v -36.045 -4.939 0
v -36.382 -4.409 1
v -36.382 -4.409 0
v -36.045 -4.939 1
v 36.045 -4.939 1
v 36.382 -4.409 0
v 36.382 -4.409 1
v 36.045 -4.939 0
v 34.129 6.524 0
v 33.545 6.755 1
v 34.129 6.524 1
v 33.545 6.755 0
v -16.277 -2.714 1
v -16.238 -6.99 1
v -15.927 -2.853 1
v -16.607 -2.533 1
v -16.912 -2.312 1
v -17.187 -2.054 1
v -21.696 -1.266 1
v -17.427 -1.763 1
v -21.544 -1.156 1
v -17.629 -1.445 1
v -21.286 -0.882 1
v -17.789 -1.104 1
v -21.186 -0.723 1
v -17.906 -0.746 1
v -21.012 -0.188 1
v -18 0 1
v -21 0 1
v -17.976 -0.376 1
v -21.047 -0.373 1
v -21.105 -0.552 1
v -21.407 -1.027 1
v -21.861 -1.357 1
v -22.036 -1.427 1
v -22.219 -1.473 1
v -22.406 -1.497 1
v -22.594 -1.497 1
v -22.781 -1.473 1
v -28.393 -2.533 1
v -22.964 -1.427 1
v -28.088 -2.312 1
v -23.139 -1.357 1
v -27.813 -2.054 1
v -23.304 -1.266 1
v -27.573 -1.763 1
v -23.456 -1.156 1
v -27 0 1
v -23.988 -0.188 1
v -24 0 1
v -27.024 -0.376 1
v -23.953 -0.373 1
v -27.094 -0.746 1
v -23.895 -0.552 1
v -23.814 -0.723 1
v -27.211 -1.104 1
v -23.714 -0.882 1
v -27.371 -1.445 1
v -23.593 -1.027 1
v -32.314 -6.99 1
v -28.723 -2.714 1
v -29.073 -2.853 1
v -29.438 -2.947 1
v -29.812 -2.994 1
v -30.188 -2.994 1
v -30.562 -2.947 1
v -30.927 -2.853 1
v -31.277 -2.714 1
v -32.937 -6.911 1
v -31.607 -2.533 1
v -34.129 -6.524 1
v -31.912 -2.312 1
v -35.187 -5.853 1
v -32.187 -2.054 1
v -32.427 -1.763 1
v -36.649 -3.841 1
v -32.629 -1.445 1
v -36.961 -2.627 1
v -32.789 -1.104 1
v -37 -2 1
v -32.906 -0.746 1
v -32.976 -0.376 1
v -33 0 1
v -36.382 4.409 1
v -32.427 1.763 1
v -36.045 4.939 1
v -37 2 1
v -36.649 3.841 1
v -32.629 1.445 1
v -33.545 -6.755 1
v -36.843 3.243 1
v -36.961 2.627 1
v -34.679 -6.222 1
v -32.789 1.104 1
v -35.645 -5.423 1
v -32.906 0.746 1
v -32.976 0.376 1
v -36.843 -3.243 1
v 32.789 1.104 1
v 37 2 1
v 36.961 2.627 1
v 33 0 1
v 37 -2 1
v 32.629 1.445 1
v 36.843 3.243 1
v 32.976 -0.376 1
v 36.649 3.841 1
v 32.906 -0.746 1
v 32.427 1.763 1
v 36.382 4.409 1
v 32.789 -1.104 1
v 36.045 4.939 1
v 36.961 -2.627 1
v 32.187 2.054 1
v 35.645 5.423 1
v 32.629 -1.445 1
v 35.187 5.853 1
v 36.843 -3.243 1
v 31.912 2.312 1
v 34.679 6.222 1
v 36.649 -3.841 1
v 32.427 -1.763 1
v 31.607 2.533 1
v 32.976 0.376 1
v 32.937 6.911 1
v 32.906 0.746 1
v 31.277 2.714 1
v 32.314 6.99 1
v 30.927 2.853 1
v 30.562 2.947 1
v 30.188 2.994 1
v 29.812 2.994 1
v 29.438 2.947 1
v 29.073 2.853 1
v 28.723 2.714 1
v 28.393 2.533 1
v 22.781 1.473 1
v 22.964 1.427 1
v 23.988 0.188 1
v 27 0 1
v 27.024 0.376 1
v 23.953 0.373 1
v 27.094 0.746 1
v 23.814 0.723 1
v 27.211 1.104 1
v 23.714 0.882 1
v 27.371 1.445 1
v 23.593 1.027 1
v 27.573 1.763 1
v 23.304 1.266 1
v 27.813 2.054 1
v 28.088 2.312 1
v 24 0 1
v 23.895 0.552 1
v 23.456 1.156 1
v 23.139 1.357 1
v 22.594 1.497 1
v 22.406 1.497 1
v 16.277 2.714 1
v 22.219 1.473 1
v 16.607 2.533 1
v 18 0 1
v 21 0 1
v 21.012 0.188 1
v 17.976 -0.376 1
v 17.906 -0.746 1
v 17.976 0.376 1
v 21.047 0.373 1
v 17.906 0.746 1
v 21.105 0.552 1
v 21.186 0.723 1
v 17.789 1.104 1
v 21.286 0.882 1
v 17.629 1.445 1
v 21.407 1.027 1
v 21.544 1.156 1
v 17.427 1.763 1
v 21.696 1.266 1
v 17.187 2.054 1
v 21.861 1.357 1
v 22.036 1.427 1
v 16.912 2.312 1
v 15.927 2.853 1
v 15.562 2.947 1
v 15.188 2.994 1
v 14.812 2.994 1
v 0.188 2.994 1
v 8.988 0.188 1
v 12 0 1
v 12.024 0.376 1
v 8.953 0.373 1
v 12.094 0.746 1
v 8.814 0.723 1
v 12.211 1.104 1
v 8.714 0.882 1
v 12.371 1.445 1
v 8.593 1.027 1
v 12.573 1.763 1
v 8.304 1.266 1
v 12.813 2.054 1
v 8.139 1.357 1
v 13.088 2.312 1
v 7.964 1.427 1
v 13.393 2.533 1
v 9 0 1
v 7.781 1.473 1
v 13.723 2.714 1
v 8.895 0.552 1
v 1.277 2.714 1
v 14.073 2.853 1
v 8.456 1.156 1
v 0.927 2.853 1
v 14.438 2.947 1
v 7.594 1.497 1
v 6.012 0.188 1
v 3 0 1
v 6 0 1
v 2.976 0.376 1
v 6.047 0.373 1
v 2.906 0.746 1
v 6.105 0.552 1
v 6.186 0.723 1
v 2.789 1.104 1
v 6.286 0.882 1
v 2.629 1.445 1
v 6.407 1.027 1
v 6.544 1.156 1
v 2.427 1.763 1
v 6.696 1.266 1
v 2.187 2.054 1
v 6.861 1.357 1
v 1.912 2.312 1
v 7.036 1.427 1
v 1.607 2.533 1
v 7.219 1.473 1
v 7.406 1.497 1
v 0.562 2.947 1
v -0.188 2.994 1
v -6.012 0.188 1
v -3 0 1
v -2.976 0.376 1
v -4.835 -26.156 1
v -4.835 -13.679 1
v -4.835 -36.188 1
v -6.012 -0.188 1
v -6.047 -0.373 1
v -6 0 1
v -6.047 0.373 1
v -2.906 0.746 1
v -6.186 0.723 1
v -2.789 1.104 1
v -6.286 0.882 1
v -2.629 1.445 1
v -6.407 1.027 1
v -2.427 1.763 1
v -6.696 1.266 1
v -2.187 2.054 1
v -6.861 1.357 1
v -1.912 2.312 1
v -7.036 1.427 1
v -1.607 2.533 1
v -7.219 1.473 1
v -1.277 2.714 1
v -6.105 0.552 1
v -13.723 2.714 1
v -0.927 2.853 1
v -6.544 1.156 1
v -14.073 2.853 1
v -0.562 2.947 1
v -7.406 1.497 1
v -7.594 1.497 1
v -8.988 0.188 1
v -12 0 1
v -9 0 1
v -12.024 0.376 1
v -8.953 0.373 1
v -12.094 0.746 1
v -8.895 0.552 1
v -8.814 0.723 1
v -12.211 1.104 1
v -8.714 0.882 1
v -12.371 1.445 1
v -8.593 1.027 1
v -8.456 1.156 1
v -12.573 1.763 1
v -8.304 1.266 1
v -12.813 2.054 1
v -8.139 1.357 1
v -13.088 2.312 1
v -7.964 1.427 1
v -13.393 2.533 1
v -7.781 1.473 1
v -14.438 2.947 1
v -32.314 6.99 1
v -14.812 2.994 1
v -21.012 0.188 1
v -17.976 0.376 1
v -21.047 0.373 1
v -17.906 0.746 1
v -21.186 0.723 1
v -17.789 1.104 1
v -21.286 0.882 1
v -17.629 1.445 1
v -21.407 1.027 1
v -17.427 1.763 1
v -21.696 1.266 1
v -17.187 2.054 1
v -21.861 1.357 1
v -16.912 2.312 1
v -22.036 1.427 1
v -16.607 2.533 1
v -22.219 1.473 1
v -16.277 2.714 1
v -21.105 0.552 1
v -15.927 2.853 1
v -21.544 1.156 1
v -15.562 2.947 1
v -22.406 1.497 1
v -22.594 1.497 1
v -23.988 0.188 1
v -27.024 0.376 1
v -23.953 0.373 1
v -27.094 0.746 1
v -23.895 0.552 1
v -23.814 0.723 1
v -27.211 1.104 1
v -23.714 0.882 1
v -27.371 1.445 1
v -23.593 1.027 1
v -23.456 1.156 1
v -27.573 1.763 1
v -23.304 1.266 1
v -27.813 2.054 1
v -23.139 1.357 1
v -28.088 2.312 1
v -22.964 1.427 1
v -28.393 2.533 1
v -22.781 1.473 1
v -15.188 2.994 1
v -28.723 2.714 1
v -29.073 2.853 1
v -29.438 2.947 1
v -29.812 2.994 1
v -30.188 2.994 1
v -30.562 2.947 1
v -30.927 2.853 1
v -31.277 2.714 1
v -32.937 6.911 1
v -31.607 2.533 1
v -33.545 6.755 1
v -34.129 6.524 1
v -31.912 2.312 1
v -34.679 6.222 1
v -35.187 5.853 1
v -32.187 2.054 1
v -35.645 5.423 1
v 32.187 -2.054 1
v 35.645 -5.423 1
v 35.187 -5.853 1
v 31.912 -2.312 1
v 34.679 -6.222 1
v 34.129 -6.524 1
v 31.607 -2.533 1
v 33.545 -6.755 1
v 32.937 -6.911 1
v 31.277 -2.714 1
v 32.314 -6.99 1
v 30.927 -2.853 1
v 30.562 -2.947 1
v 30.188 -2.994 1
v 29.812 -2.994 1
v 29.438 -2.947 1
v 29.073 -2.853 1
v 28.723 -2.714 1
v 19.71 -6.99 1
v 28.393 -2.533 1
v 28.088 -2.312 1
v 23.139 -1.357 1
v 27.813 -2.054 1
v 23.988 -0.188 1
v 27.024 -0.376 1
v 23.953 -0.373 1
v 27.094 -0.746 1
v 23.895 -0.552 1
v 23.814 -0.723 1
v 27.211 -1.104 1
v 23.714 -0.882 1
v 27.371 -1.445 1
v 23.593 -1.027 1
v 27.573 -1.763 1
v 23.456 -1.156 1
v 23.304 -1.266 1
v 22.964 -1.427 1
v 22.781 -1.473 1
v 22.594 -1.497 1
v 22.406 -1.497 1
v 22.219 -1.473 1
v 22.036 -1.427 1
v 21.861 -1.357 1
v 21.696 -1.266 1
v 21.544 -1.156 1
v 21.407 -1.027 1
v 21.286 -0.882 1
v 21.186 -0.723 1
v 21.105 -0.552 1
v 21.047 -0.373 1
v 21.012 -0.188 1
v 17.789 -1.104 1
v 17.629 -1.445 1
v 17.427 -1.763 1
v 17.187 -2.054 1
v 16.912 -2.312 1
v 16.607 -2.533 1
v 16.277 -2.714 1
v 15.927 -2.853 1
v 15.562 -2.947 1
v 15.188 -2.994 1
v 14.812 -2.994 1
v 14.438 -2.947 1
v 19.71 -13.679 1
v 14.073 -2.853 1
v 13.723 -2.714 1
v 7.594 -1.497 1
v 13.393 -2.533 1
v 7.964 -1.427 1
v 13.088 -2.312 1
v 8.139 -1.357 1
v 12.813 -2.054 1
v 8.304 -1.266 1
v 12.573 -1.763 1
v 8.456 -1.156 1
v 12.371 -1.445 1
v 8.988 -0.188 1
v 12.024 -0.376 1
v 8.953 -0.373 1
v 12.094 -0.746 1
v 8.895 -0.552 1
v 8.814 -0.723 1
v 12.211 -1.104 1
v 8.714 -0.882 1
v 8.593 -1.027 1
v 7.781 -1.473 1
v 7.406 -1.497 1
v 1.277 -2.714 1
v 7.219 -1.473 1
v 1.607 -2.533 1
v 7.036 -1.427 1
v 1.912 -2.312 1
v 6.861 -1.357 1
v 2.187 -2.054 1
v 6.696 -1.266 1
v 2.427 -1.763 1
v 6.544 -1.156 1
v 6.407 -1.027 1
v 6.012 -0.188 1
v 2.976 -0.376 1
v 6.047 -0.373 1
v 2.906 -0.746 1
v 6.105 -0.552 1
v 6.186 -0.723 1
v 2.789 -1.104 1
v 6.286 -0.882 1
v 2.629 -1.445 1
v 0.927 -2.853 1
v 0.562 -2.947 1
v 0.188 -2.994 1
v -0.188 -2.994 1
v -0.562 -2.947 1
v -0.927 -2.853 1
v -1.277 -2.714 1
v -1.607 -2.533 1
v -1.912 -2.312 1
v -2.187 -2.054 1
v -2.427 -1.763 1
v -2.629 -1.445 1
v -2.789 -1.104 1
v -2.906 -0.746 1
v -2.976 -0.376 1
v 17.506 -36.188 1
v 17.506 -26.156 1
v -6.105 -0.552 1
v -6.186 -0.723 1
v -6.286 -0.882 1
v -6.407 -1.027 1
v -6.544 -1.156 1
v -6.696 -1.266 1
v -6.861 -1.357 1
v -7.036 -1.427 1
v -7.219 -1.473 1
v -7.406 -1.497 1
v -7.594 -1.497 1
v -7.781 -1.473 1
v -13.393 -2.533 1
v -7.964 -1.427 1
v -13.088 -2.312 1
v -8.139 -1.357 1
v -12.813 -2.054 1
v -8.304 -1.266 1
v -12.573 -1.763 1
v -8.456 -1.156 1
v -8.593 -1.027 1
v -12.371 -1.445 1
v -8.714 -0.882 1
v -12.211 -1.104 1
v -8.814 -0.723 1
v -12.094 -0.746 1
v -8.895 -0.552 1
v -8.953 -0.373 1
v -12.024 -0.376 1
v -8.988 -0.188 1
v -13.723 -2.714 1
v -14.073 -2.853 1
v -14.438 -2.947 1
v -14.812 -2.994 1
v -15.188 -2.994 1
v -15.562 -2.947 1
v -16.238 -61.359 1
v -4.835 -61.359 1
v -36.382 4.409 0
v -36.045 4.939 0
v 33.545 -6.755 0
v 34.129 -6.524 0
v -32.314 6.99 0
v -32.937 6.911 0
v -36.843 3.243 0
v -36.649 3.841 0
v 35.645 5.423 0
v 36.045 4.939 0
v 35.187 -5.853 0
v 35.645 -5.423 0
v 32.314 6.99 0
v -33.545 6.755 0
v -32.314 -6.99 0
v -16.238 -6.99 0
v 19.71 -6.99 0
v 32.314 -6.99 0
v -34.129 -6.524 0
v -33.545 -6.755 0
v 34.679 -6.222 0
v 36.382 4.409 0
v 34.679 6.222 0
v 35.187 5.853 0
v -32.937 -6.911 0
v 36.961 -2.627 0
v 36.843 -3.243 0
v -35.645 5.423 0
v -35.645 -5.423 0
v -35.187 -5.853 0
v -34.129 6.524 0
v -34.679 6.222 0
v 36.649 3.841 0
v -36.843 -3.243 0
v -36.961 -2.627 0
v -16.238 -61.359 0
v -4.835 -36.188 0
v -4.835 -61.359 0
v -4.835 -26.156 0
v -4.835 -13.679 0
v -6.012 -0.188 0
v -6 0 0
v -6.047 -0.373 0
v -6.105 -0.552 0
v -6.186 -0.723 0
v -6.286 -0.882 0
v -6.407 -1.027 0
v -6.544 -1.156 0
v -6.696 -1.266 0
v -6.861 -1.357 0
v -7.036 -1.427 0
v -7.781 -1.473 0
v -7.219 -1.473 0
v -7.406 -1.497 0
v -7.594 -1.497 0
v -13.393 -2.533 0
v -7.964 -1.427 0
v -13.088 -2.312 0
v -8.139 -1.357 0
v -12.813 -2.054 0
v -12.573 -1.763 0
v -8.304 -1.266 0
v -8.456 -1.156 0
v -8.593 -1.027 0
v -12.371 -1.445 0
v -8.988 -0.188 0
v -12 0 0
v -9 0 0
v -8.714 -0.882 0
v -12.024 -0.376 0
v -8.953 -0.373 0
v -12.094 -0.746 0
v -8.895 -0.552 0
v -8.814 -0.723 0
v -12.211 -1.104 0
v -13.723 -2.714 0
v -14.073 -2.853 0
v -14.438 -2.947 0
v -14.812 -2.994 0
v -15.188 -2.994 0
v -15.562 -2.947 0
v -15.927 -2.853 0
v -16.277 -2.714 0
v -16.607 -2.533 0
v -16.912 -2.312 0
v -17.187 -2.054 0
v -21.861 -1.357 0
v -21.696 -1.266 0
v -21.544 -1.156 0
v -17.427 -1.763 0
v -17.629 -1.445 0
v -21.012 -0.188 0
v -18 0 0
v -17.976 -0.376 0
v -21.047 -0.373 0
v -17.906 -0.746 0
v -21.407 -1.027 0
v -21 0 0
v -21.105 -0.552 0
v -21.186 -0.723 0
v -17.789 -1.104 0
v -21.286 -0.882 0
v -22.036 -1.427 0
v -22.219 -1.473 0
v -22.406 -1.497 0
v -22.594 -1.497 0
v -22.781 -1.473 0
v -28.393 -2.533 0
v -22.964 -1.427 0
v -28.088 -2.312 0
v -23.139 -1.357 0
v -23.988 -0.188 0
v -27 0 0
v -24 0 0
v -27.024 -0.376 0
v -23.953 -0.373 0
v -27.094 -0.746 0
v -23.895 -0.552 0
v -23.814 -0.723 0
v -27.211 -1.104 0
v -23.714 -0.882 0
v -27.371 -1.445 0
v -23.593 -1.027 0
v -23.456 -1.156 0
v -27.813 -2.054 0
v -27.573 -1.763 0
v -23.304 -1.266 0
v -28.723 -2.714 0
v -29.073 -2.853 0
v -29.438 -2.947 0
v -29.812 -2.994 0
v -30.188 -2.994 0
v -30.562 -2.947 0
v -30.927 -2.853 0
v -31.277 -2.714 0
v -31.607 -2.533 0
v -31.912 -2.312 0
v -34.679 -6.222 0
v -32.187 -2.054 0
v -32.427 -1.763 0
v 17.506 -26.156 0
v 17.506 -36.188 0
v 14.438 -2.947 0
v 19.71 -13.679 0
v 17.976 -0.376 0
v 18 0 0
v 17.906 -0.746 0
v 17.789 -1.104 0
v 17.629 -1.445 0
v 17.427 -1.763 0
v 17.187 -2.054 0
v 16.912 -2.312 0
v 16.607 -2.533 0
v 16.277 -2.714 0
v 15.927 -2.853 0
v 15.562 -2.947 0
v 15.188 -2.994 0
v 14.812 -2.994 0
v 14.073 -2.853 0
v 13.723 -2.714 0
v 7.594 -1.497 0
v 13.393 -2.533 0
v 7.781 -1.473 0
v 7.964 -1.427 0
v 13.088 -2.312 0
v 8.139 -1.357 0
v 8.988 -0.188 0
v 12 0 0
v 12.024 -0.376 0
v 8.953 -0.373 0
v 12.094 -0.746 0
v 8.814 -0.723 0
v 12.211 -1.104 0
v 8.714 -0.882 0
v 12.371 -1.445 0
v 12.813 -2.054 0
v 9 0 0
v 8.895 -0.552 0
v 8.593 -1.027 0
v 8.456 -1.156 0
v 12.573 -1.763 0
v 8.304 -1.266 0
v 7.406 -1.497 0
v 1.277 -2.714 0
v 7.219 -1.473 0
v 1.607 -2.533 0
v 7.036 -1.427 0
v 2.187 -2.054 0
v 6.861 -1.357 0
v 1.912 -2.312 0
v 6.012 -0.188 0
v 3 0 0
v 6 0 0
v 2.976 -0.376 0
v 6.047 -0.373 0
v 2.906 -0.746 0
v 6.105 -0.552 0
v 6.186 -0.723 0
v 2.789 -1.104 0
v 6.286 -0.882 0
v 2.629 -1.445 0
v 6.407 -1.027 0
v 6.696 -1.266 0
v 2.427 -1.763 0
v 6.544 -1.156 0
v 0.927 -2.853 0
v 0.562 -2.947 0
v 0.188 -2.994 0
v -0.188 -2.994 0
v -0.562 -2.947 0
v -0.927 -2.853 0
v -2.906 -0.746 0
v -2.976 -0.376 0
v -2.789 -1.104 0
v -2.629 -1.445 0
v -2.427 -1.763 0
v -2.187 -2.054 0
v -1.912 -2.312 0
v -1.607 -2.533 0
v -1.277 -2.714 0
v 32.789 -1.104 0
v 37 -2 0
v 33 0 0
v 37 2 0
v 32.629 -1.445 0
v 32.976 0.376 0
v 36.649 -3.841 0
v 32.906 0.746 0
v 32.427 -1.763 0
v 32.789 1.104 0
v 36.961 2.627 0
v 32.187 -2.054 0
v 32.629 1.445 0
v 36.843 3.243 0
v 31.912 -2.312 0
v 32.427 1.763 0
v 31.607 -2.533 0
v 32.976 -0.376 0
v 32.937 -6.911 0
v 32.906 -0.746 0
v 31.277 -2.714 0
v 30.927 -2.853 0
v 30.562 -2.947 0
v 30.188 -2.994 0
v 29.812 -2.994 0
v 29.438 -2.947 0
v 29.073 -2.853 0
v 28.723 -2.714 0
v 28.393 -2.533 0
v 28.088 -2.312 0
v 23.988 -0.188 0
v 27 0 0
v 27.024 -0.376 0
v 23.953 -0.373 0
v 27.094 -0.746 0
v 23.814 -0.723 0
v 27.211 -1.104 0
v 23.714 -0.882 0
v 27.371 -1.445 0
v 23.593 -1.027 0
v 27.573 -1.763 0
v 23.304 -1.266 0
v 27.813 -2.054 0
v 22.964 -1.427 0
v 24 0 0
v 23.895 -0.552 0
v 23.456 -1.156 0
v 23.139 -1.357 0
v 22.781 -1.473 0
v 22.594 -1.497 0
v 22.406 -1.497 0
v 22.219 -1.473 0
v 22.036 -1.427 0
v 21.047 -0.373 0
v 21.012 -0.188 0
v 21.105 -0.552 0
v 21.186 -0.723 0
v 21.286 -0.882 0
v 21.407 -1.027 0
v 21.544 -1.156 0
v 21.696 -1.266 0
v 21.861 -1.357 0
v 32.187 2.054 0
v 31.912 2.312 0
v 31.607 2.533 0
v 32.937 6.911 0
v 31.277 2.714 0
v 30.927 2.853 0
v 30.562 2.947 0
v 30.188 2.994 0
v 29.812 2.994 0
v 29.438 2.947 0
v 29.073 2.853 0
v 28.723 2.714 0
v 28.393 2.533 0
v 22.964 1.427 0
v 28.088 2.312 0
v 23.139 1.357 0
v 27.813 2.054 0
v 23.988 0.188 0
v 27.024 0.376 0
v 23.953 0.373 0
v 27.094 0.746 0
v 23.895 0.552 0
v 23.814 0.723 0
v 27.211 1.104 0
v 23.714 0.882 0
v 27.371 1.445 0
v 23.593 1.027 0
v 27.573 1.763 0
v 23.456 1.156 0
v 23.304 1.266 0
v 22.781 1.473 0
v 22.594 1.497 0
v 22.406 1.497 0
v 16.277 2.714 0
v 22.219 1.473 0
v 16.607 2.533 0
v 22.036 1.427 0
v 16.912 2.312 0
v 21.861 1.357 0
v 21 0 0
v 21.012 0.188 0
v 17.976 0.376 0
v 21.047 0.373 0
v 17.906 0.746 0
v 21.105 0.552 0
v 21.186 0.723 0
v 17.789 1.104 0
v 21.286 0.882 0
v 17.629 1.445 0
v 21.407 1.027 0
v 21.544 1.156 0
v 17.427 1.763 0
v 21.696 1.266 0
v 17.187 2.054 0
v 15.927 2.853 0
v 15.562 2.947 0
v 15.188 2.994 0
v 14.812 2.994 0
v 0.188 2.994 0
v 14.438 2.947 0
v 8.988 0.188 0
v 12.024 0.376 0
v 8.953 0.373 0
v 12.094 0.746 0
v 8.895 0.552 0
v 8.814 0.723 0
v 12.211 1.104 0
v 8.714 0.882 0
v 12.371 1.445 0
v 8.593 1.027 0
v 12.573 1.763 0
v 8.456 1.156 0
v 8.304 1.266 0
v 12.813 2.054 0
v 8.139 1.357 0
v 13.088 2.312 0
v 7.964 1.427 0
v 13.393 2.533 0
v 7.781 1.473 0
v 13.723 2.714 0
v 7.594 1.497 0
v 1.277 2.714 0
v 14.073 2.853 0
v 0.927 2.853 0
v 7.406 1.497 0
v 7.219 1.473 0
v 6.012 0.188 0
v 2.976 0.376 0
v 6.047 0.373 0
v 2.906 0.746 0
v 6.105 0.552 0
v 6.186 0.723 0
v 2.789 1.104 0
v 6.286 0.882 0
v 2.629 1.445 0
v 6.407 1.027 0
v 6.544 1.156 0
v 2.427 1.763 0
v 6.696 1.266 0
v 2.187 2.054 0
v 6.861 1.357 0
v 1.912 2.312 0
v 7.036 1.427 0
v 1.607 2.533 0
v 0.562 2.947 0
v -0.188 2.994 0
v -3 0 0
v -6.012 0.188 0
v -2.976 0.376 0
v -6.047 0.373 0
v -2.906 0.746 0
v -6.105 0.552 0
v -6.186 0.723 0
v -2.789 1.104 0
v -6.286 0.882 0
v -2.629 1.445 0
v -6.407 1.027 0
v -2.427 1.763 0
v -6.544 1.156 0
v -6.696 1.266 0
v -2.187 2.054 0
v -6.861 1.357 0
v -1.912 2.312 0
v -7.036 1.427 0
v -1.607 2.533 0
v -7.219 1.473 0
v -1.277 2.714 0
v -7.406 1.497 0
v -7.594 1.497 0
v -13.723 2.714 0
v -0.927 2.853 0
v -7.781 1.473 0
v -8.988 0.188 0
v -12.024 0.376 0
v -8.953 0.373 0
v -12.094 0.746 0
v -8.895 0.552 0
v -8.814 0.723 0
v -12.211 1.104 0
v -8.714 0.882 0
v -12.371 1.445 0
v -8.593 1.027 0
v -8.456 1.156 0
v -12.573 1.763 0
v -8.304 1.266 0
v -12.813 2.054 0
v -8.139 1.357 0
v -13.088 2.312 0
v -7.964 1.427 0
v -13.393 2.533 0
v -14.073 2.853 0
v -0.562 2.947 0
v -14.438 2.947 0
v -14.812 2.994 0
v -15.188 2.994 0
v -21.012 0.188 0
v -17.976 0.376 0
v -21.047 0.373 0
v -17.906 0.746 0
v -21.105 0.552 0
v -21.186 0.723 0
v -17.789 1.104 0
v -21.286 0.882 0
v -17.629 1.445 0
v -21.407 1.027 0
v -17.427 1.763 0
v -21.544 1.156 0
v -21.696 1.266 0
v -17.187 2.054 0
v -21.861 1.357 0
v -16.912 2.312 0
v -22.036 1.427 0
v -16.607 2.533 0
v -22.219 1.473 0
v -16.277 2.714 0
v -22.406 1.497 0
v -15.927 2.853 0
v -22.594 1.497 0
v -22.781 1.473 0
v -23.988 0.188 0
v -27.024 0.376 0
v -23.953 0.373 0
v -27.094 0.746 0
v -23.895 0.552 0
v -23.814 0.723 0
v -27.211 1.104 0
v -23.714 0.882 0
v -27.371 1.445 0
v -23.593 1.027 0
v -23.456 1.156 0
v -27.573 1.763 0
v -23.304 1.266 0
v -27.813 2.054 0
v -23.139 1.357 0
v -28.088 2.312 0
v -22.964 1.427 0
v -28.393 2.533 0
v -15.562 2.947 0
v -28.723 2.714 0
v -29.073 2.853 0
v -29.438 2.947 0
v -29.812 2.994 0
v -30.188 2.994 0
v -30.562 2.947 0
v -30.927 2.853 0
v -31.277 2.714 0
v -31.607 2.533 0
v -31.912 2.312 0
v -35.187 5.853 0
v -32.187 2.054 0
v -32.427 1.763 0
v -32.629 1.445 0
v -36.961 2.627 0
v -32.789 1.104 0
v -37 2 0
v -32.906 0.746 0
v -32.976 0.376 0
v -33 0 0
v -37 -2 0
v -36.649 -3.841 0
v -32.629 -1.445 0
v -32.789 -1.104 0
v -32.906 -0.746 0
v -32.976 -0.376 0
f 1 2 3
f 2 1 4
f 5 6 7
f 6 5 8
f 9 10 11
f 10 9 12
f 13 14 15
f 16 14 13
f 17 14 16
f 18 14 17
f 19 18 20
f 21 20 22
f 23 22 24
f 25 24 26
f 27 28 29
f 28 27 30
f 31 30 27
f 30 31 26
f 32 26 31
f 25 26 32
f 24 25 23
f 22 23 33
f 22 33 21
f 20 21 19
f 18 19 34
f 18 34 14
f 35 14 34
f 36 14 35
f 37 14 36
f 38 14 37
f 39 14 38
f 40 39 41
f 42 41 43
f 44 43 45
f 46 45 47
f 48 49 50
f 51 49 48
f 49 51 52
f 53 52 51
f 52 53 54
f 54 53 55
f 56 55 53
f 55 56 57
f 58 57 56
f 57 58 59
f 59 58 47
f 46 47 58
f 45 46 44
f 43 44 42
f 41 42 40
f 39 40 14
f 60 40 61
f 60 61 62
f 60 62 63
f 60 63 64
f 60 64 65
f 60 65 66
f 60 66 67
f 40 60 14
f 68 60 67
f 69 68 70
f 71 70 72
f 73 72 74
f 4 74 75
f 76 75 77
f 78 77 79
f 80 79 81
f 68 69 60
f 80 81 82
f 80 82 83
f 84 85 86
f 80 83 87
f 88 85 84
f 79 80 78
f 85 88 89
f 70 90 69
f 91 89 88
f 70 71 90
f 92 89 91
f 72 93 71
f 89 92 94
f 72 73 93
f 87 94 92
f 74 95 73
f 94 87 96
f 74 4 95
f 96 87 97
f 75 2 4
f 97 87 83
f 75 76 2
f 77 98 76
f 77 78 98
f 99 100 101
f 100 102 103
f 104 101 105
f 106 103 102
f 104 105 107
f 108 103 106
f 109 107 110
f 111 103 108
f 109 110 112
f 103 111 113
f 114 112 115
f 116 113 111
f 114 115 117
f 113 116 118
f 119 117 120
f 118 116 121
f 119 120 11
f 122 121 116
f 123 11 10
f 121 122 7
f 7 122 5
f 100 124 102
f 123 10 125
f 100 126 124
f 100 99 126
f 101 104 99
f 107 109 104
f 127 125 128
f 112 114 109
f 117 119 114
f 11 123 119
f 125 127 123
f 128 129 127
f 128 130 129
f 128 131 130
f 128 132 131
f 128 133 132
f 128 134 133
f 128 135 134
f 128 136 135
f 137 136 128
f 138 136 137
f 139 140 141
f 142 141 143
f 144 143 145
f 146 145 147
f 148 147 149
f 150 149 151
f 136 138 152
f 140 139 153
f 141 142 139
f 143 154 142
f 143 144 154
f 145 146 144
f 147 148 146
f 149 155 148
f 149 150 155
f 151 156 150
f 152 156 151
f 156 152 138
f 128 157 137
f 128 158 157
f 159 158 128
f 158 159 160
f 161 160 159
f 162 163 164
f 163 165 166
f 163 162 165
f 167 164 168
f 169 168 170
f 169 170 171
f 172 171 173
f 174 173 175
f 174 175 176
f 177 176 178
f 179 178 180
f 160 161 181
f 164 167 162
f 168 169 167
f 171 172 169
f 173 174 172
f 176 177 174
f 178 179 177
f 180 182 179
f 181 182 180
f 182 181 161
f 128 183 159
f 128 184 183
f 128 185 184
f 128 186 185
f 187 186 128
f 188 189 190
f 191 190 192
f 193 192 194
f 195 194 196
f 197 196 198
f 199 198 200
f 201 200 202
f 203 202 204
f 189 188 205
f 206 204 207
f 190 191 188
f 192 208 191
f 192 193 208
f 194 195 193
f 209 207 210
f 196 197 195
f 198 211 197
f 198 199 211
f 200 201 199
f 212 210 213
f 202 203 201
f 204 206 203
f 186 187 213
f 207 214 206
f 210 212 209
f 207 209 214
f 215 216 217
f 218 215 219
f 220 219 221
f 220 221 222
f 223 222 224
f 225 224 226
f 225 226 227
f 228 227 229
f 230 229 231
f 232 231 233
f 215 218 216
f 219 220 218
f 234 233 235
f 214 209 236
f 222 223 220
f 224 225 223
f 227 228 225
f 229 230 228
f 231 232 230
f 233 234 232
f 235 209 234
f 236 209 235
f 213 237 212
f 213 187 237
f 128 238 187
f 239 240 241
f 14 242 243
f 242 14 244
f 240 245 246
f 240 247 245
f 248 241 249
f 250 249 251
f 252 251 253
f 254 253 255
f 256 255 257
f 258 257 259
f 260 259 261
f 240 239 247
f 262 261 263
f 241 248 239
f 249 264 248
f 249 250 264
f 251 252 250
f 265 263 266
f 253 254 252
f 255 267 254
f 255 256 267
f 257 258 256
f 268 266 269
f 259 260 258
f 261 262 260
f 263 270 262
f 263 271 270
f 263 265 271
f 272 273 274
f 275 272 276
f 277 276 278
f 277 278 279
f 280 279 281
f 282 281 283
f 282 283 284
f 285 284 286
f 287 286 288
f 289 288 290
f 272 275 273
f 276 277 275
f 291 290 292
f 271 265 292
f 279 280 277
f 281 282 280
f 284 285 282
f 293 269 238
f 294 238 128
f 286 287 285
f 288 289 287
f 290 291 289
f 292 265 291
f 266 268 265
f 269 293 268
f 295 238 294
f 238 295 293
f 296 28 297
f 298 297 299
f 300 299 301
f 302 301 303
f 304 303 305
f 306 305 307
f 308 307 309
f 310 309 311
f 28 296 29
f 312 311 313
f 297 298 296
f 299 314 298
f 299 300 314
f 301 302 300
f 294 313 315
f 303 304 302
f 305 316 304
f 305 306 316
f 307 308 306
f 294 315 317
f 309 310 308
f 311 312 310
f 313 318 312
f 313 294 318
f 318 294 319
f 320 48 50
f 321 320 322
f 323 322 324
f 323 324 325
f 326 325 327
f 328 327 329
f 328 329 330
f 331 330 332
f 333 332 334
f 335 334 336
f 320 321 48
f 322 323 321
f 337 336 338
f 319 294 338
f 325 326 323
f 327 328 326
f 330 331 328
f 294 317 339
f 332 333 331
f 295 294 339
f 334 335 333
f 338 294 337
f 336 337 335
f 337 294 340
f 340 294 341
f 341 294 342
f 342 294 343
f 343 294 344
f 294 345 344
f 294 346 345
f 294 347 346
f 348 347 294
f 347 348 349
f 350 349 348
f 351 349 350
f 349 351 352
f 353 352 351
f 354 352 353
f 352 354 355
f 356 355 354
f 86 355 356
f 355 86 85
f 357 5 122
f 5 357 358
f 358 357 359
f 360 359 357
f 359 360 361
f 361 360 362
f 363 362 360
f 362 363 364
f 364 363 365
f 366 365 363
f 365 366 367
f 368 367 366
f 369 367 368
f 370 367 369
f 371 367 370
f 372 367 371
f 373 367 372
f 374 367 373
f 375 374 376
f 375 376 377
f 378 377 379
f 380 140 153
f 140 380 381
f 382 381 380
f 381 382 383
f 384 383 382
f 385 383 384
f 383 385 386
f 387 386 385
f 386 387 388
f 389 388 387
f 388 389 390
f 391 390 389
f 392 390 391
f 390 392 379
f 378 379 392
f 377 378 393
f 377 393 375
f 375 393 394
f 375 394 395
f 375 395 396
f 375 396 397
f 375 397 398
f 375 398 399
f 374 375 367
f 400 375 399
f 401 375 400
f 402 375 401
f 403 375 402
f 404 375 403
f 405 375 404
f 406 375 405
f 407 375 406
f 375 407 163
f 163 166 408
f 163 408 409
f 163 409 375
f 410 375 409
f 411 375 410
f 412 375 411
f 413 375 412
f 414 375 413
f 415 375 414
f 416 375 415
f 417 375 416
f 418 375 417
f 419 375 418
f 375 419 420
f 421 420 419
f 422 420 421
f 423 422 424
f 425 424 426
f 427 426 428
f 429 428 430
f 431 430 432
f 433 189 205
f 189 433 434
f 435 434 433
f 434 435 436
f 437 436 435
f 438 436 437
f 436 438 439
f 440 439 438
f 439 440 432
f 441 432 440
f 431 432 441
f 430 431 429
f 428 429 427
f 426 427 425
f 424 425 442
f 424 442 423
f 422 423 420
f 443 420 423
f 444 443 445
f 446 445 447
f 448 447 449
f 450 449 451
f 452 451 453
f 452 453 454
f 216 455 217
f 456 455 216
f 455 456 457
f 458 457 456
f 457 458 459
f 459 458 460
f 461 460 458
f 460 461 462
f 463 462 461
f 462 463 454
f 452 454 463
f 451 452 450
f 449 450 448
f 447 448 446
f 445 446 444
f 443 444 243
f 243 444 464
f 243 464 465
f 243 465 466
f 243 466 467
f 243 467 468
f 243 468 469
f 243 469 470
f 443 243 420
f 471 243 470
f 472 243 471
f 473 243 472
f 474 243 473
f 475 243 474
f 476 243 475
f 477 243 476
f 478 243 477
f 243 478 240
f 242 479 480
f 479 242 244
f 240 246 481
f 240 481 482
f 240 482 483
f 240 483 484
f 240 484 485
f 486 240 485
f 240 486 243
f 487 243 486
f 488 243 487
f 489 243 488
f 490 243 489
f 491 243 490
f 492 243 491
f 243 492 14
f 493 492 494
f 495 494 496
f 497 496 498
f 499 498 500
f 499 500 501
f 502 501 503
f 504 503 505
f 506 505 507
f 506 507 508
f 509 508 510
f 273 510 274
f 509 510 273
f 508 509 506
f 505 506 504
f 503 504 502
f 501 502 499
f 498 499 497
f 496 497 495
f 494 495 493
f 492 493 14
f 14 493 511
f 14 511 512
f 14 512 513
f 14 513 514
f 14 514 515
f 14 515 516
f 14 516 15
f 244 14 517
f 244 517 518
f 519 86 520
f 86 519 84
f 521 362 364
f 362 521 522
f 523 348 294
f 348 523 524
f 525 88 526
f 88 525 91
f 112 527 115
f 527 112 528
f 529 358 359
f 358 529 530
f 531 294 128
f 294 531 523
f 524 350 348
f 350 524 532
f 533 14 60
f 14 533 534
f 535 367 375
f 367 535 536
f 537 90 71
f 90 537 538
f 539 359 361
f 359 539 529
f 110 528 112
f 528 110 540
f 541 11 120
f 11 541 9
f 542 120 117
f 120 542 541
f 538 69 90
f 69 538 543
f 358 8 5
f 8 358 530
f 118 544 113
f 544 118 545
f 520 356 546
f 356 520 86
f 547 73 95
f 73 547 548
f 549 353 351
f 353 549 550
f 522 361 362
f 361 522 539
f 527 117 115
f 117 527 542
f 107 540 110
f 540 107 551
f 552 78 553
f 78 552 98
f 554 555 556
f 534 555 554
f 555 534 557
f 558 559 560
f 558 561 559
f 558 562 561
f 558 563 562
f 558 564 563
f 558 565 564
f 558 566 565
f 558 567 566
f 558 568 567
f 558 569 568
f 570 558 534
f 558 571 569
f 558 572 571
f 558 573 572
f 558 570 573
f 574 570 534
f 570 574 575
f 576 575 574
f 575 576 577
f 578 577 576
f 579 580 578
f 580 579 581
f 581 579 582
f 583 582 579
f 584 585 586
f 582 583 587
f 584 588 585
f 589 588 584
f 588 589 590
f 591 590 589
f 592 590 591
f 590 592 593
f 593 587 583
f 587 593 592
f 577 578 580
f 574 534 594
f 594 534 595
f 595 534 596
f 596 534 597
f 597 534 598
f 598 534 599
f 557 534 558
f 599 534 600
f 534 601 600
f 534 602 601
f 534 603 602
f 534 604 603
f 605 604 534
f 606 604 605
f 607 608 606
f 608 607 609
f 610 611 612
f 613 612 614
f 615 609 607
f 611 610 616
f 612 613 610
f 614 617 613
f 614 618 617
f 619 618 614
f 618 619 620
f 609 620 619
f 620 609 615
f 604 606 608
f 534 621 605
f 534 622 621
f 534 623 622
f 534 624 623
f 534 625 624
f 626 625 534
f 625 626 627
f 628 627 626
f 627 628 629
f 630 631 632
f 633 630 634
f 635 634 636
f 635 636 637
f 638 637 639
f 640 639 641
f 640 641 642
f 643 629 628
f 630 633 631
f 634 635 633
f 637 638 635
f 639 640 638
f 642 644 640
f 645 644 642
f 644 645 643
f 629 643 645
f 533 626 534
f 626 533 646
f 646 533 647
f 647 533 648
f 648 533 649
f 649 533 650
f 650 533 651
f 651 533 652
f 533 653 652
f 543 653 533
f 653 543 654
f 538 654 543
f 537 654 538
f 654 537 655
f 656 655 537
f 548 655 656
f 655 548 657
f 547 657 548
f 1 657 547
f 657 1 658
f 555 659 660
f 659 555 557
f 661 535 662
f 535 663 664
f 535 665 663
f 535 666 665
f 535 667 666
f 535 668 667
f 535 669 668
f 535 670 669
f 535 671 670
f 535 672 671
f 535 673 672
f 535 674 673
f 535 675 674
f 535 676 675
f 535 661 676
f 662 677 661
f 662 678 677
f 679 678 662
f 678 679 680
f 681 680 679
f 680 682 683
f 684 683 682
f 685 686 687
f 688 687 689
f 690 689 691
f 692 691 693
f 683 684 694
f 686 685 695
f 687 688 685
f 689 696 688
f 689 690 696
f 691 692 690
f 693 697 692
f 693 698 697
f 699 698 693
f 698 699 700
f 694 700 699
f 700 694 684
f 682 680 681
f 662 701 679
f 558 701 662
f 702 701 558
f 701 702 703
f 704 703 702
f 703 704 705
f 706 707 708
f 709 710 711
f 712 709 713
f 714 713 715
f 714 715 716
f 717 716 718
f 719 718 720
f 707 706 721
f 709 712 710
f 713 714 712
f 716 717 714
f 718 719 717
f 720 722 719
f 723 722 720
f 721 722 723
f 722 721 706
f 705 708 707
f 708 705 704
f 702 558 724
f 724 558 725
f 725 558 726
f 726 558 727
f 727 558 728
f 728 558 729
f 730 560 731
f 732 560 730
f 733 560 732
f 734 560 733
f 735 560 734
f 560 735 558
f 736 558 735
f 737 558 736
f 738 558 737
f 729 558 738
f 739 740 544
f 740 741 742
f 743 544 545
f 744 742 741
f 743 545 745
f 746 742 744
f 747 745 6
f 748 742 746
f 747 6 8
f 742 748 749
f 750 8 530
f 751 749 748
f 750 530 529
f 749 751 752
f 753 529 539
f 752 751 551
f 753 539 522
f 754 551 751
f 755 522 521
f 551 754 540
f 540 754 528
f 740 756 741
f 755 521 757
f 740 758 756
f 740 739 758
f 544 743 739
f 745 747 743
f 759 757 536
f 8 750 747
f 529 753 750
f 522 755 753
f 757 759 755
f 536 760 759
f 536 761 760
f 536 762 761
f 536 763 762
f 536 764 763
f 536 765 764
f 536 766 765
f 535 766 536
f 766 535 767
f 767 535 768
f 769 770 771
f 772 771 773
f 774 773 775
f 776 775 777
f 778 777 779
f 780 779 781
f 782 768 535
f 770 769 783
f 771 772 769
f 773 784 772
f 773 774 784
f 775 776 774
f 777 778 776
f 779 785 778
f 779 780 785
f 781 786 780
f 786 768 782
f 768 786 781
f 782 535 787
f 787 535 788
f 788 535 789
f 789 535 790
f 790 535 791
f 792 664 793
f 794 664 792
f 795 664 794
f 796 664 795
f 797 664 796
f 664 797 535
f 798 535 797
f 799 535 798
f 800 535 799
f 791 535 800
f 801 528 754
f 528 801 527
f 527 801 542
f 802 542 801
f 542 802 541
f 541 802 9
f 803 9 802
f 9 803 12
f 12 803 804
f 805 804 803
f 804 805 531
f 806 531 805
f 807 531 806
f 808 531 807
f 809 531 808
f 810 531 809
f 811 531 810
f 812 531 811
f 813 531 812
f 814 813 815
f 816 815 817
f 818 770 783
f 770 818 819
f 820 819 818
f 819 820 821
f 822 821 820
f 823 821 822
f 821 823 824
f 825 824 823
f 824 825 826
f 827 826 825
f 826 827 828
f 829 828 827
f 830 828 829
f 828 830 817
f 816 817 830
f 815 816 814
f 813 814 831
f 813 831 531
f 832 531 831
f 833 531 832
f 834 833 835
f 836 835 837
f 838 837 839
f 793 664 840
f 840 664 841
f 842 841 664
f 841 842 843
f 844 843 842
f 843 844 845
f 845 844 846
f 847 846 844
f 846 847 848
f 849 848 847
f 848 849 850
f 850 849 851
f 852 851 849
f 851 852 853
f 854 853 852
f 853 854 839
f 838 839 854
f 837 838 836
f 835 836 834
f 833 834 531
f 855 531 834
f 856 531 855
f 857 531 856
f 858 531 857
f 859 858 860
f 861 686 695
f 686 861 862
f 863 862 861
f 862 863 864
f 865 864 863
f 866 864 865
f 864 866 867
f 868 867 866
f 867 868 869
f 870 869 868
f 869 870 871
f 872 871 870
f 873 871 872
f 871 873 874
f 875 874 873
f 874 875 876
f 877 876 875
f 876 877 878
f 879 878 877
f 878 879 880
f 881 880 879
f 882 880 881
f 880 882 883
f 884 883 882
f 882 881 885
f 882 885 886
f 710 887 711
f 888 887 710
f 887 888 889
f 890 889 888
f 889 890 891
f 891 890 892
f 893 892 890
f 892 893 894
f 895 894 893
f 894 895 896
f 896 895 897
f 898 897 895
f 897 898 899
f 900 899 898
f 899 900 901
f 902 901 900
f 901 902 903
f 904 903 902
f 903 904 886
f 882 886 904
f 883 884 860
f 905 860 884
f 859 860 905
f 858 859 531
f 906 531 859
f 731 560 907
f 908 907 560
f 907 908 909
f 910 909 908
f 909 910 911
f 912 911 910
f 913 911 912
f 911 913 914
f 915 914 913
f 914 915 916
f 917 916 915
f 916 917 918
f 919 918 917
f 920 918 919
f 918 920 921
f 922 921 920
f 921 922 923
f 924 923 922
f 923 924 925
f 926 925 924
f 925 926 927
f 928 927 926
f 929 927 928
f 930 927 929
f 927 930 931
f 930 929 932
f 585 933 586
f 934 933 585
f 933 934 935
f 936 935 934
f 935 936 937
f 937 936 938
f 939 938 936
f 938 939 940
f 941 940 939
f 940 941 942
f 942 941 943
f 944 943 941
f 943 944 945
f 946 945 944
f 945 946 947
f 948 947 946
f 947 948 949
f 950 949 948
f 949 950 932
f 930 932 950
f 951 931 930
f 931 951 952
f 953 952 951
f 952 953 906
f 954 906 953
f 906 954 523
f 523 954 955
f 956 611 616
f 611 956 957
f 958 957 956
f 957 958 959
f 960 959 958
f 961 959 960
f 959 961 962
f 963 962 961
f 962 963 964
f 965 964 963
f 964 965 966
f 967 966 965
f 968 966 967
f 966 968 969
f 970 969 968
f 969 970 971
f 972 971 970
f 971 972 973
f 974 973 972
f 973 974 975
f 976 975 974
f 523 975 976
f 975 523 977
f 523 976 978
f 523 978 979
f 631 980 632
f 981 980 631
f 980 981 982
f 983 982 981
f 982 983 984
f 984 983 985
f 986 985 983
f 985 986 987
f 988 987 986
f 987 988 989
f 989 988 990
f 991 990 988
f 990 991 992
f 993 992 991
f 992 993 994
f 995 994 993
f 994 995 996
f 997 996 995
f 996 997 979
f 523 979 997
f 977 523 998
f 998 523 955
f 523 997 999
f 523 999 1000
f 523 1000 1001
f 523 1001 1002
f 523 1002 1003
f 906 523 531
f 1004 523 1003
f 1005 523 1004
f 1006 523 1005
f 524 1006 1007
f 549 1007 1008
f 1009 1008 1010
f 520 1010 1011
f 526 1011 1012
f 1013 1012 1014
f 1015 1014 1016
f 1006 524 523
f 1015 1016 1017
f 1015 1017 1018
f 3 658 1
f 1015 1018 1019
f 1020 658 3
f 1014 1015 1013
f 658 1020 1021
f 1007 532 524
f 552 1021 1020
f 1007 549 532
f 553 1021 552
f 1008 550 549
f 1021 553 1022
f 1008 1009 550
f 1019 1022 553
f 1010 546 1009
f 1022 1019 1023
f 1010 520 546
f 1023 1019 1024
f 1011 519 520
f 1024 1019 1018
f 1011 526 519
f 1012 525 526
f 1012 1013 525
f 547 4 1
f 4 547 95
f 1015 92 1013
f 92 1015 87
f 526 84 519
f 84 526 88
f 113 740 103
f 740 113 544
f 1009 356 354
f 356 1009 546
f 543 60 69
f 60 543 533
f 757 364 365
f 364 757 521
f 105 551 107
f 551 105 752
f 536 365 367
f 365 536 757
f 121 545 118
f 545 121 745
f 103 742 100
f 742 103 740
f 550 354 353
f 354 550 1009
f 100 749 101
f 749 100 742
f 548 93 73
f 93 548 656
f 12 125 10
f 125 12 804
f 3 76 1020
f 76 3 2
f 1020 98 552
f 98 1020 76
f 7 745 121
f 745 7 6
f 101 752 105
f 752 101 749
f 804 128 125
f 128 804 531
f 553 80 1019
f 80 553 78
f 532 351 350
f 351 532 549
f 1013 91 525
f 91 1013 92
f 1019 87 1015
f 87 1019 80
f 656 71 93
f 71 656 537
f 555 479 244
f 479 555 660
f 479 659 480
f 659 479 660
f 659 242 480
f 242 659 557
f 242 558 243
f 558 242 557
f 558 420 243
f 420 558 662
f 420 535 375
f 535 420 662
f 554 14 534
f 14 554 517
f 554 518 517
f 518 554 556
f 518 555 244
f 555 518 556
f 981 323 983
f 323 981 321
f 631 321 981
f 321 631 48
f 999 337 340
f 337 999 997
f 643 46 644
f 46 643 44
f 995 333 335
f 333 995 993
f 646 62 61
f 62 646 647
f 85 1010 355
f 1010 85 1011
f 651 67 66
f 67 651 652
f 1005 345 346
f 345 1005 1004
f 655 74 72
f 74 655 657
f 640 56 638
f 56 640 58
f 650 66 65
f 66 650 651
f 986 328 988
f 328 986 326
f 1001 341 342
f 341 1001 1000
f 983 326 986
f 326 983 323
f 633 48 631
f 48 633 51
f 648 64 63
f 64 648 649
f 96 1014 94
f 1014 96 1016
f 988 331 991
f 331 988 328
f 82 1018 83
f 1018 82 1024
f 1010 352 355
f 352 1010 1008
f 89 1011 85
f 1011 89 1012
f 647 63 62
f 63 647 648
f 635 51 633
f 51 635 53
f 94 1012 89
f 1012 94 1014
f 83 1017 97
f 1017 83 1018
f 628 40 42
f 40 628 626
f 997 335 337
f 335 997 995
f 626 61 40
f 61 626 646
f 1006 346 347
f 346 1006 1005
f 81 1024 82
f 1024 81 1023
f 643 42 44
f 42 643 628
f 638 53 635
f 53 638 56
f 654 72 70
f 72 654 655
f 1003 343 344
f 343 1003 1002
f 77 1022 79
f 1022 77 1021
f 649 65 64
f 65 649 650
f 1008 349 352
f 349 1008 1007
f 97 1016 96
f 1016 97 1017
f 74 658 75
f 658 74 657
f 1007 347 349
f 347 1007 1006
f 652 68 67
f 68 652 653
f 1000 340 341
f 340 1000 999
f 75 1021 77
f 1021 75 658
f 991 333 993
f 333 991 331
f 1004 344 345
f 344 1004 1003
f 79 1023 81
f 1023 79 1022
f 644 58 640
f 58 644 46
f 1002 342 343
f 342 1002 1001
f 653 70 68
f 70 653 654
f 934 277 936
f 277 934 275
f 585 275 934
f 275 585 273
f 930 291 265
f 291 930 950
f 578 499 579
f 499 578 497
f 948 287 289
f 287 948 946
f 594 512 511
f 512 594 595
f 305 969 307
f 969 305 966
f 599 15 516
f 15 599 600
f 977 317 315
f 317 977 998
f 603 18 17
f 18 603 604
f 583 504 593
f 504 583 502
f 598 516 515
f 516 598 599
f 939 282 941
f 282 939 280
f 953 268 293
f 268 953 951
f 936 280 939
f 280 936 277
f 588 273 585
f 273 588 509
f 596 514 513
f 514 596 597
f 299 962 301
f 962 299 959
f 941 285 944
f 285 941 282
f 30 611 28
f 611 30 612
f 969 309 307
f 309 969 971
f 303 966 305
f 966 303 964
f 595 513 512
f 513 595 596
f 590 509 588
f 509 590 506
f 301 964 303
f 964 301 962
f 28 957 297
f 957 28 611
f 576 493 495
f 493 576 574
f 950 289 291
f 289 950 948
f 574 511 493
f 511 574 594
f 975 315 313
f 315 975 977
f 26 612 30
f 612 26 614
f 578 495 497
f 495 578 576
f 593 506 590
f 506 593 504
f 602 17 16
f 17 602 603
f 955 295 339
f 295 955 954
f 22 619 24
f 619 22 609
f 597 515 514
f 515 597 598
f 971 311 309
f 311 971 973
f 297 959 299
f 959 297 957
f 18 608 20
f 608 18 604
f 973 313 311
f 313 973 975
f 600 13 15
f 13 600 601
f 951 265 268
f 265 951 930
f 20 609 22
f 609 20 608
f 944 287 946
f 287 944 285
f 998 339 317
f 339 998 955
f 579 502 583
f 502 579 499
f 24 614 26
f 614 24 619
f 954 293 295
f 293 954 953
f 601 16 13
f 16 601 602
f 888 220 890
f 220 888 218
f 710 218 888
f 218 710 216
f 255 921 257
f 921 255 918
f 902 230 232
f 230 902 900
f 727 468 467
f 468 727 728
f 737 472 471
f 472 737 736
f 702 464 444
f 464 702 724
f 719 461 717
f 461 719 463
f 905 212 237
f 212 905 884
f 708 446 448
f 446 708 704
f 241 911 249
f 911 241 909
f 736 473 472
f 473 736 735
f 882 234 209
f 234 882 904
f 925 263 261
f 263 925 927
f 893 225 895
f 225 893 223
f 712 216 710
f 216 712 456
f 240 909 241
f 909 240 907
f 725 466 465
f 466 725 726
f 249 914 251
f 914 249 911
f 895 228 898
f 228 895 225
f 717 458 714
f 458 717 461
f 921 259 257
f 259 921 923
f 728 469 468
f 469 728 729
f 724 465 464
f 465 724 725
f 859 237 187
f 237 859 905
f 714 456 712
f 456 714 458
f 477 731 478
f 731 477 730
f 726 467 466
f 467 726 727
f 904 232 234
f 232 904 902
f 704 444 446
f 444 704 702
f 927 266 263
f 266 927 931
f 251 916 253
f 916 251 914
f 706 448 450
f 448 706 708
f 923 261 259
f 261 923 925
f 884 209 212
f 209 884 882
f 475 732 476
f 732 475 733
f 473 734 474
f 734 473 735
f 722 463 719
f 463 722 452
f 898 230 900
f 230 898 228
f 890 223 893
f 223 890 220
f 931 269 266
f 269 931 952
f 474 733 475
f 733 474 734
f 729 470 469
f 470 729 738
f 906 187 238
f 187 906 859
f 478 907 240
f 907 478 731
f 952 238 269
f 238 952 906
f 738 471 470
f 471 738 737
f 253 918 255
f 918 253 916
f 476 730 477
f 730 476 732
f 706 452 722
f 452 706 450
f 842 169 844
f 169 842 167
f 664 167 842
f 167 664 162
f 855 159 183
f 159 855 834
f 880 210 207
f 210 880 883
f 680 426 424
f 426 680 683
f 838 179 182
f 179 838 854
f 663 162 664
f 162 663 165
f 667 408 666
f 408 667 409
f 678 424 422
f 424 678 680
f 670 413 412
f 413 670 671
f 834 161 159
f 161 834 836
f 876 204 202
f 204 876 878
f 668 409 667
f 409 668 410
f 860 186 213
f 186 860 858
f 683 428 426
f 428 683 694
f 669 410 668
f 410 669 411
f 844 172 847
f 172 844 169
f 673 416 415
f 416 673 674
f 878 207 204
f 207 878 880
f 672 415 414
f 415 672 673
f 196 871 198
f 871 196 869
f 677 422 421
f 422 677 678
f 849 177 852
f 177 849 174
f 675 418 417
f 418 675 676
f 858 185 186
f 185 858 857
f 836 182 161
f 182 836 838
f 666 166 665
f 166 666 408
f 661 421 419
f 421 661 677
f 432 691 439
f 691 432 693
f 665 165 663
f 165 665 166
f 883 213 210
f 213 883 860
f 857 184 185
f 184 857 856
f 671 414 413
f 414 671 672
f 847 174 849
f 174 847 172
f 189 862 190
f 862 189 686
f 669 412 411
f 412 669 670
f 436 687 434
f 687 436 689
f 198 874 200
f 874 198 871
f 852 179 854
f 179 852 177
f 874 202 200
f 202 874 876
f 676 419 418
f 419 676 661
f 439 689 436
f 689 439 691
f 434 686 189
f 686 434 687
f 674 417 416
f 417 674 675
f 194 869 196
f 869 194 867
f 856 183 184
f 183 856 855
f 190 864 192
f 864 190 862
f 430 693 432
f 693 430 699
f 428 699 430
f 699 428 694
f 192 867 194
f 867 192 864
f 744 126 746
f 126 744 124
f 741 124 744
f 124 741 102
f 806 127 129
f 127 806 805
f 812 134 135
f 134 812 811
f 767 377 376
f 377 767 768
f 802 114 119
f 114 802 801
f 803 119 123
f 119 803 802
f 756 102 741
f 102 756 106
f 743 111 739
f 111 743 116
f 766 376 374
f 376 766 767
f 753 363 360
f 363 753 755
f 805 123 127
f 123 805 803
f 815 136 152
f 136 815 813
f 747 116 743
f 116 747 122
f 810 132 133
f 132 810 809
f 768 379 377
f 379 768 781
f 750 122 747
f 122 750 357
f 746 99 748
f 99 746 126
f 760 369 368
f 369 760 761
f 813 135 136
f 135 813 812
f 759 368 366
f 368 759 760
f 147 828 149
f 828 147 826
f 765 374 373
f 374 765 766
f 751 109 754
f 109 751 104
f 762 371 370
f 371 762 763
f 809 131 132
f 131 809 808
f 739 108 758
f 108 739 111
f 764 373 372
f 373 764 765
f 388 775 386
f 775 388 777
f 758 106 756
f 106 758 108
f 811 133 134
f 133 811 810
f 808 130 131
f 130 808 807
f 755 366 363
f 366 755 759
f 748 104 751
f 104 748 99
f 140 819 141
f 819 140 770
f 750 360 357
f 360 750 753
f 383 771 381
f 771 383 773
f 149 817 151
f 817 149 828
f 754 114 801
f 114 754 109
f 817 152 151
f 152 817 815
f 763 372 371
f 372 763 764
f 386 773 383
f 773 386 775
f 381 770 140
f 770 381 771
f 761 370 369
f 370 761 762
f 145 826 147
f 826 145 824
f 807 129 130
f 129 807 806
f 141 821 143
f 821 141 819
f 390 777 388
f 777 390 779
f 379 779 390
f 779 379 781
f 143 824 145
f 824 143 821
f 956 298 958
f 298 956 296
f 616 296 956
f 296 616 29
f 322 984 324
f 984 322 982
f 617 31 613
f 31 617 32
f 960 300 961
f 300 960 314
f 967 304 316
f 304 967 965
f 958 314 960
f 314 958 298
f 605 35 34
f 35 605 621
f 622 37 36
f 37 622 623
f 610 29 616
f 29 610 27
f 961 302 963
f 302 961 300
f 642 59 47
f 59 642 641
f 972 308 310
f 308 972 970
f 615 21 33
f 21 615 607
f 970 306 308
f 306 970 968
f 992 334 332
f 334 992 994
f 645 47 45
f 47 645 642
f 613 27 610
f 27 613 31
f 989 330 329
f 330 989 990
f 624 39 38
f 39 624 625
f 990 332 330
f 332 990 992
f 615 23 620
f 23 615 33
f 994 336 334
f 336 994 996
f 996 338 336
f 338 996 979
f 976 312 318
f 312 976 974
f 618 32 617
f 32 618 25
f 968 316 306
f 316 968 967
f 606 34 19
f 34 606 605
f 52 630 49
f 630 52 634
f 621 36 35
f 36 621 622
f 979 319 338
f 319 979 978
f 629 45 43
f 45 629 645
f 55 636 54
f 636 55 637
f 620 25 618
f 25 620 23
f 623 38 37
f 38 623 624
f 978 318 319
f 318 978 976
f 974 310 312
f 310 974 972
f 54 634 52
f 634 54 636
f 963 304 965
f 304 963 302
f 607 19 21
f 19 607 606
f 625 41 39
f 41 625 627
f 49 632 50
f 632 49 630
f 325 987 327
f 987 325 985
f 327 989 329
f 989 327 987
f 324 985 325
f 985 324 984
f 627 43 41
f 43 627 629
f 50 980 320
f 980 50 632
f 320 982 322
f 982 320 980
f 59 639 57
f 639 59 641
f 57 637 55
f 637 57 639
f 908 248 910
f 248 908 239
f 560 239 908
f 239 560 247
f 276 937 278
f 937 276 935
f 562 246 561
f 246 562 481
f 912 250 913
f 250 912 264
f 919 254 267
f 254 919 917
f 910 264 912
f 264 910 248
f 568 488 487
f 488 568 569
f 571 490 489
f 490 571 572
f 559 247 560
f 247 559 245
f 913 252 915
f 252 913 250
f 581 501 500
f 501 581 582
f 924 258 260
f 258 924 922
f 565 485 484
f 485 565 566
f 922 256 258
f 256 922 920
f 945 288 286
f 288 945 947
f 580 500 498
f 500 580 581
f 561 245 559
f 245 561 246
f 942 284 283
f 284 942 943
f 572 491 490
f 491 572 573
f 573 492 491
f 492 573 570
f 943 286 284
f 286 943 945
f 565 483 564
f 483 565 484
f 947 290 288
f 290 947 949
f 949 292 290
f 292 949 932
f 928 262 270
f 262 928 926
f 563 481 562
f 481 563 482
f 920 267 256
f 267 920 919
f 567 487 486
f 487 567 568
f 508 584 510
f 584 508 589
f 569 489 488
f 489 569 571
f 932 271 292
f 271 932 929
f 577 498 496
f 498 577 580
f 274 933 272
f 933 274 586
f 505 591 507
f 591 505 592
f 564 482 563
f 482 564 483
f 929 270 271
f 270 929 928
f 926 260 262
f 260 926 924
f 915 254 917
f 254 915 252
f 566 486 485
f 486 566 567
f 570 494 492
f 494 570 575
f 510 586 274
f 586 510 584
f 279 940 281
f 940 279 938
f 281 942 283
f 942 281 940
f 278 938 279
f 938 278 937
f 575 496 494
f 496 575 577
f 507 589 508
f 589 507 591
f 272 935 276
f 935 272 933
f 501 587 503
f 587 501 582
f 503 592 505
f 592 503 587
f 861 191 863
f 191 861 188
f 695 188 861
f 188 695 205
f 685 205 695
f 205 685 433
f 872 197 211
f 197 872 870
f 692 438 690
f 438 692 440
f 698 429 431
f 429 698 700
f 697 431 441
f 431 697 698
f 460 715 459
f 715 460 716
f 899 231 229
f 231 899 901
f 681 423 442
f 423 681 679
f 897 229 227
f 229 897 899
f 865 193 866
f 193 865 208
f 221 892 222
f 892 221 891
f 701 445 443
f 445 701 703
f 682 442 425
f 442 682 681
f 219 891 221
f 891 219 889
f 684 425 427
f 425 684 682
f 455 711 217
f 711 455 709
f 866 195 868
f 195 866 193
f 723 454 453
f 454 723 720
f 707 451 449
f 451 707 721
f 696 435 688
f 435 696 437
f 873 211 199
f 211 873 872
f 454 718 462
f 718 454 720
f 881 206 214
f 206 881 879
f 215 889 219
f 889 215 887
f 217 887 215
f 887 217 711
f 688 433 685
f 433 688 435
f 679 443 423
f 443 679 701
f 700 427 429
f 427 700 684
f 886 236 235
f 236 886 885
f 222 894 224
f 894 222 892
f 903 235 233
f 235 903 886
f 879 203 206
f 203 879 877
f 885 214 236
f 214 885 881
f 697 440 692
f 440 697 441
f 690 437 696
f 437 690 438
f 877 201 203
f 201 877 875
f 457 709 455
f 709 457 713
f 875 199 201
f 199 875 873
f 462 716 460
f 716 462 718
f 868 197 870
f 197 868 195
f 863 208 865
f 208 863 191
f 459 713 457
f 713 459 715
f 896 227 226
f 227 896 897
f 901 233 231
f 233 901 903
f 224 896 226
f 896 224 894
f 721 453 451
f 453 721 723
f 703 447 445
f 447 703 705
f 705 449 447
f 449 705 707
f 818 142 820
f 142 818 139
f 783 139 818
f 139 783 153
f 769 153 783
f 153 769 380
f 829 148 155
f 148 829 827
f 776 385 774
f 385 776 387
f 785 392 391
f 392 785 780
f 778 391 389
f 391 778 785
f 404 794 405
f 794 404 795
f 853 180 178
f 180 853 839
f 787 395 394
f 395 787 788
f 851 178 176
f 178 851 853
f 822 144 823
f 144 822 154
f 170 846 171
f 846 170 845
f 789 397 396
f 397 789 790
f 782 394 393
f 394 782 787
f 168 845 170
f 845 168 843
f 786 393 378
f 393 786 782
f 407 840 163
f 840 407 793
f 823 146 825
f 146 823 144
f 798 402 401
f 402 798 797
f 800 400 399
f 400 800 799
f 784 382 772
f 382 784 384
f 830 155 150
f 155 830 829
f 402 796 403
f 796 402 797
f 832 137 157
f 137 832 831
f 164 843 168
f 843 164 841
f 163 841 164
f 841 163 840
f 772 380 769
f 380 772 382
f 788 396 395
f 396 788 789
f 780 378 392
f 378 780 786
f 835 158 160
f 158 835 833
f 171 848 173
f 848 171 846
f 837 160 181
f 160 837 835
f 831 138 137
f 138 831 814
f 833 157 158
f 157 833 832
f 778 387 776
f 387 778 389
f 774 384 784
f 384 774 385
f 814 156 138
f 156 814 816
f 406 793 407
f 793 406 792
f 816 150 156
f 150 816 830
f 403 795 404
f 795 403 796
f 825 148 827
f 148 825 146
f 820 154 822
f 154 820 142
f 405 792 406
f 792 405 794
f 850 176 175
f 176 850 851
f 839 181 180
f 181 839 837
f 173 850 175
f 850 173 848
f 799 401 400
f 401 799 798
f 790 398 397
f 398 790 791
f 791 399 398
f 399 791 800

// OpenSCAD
$fn = 50;


difference() {
	union() {
		*color(alpha = 1.0000000000, c = "gray") {
			translate(v = [0, 14, 0]) {
				linear_extrude(height = 1) {
					text(font = "Arial:style=Bold", halign = "center", size = 4.5000000000, text = "COMMENT description oobb_plate_shape_p_type_1_depth_5_width_1_thickness_f_extra_oobb_size", valign = "center");
				}
			}
		}
		hull() {
			translate(v = [-32.0000000000, 2.0000000000, 0]) {
				cylinder(h = 1, r = 5);
			}
			translate(v = [32.0000000000, 2.0000000000, 0]) {
				cylinder(h = 1, r = 5);
			}
			translate(v = [-32.0000000000, -2.0000000000, 0]) {
				cylinder(h = 1, r = 5);
			}
			translate(v = [32.0000000000, -2.0000000000, 0]) {
				cylinder(h = 1, r = 5);
			}
		}
		translate(v = [0, -5, 0]) {
			linear_extrude(height = 1) {
				text(font = "DejaVu Sans Mono:style=Bold", halign = "center", size = 57.0000000000, text = "F", valign = "top");
			}
		}
	}
	union() {
		*color(alpha = 1.0000000000, c = "gray") {
			translate(v = [0, 14, 0]) {
				linear_extrude(height = 1) {
					text(font = "Arial:style=Bold", halign = "center", size = 4.5000000000, text = "COMMENT description oobb_holes_shape_n_type_5_width_1_thickness_f_extra_oobb_size_1_height_'all'_holes_true_both_holes", valign = "center");
				}
			}
		}
		translate(v = [-30.0000000000, 0.0000000000, 0]) {
			translate(v = [0, 0, -50]) {
				cylinder(h = 100, r = 3.0000000000);
			}
		}
		translate(v = [-15.0000000000, 0.0000000000, 0]) {
			translate(v = [0, 0, -50]) {
				cylinder(h = 100, r = 3.0000000000);
			}
		}
		translate(v = [0, 0, -50]) {
			cylinder(h = 100, r = 3.0000000000);
		}
		translate(v = [15.0000000000, 0.0000000000, 0]) {
			translate(v = [0, 0, -50]) {
				cylinder(h = 100, r = 3.0000000000);
			}
		}
		translate(v = [30.0000000000, 0.0000000000, 0]) {
			translate(v = [0, 0, -50]) {
				cylinder(h = 100, r = 3.0000000000);
			}
		}
		translate(v = [-30.0000000000, 0.0000000000, 0]) {
			translate(v = [0, 0, -50]) {
				cylinder(h = 100, r = 1.5000000000);
			}
		}
		translate(v = [-22.5000000000, 0.0000000000, 0]) {
			translate(v = [0, 0, -50]) {
				cylinder(h = 100, r = 1.5000000000);
			}
		}
		translate(v = [-15.0000000000, 0.0000000000, 0]) {
			translate(v = [0, 0, -50]) {
				cylinder(h = 100, r = 1.5000000000);
			}
		}
		translate(v = [-7.5000000000, 0.0000000000, 0]) {
			translate(v = [0, 0, -50]) {
				cylinder(h = 100, r = 1.5000000000);
			}
		}
		translate(v = [0, 0, -50]) {
			cylinder(h = 100, r = 1.5000000000);
		}
		translate(v = [7.5000000000, 0.0000000000, 0]) {
			translate(v = [0, 0, -50]) {
				cylinder(h = 100, r = 1.5000000000);
			}
		}
		translate(v = [15.0000000000, 0.0000000000, 0]) {
			translate(v = [0, 0, -50]) {
				cylinder(h = 100, r = 1.5000000000);
			}
		}
		translate(v = [22.5000000000, 0.0000000000, 0]) {
			translate(v = [0, 0, -50]) {
				cylinder(h = 100, r = 1.5000000000);
			}
		}
		translate(v = [30.0000000000, 0.0000000000, 0]) {
			translate(v = [0, 0, -50]) {
				cylinder(h = 100, r = 1.5000000000);
			}
		}
	}
}
